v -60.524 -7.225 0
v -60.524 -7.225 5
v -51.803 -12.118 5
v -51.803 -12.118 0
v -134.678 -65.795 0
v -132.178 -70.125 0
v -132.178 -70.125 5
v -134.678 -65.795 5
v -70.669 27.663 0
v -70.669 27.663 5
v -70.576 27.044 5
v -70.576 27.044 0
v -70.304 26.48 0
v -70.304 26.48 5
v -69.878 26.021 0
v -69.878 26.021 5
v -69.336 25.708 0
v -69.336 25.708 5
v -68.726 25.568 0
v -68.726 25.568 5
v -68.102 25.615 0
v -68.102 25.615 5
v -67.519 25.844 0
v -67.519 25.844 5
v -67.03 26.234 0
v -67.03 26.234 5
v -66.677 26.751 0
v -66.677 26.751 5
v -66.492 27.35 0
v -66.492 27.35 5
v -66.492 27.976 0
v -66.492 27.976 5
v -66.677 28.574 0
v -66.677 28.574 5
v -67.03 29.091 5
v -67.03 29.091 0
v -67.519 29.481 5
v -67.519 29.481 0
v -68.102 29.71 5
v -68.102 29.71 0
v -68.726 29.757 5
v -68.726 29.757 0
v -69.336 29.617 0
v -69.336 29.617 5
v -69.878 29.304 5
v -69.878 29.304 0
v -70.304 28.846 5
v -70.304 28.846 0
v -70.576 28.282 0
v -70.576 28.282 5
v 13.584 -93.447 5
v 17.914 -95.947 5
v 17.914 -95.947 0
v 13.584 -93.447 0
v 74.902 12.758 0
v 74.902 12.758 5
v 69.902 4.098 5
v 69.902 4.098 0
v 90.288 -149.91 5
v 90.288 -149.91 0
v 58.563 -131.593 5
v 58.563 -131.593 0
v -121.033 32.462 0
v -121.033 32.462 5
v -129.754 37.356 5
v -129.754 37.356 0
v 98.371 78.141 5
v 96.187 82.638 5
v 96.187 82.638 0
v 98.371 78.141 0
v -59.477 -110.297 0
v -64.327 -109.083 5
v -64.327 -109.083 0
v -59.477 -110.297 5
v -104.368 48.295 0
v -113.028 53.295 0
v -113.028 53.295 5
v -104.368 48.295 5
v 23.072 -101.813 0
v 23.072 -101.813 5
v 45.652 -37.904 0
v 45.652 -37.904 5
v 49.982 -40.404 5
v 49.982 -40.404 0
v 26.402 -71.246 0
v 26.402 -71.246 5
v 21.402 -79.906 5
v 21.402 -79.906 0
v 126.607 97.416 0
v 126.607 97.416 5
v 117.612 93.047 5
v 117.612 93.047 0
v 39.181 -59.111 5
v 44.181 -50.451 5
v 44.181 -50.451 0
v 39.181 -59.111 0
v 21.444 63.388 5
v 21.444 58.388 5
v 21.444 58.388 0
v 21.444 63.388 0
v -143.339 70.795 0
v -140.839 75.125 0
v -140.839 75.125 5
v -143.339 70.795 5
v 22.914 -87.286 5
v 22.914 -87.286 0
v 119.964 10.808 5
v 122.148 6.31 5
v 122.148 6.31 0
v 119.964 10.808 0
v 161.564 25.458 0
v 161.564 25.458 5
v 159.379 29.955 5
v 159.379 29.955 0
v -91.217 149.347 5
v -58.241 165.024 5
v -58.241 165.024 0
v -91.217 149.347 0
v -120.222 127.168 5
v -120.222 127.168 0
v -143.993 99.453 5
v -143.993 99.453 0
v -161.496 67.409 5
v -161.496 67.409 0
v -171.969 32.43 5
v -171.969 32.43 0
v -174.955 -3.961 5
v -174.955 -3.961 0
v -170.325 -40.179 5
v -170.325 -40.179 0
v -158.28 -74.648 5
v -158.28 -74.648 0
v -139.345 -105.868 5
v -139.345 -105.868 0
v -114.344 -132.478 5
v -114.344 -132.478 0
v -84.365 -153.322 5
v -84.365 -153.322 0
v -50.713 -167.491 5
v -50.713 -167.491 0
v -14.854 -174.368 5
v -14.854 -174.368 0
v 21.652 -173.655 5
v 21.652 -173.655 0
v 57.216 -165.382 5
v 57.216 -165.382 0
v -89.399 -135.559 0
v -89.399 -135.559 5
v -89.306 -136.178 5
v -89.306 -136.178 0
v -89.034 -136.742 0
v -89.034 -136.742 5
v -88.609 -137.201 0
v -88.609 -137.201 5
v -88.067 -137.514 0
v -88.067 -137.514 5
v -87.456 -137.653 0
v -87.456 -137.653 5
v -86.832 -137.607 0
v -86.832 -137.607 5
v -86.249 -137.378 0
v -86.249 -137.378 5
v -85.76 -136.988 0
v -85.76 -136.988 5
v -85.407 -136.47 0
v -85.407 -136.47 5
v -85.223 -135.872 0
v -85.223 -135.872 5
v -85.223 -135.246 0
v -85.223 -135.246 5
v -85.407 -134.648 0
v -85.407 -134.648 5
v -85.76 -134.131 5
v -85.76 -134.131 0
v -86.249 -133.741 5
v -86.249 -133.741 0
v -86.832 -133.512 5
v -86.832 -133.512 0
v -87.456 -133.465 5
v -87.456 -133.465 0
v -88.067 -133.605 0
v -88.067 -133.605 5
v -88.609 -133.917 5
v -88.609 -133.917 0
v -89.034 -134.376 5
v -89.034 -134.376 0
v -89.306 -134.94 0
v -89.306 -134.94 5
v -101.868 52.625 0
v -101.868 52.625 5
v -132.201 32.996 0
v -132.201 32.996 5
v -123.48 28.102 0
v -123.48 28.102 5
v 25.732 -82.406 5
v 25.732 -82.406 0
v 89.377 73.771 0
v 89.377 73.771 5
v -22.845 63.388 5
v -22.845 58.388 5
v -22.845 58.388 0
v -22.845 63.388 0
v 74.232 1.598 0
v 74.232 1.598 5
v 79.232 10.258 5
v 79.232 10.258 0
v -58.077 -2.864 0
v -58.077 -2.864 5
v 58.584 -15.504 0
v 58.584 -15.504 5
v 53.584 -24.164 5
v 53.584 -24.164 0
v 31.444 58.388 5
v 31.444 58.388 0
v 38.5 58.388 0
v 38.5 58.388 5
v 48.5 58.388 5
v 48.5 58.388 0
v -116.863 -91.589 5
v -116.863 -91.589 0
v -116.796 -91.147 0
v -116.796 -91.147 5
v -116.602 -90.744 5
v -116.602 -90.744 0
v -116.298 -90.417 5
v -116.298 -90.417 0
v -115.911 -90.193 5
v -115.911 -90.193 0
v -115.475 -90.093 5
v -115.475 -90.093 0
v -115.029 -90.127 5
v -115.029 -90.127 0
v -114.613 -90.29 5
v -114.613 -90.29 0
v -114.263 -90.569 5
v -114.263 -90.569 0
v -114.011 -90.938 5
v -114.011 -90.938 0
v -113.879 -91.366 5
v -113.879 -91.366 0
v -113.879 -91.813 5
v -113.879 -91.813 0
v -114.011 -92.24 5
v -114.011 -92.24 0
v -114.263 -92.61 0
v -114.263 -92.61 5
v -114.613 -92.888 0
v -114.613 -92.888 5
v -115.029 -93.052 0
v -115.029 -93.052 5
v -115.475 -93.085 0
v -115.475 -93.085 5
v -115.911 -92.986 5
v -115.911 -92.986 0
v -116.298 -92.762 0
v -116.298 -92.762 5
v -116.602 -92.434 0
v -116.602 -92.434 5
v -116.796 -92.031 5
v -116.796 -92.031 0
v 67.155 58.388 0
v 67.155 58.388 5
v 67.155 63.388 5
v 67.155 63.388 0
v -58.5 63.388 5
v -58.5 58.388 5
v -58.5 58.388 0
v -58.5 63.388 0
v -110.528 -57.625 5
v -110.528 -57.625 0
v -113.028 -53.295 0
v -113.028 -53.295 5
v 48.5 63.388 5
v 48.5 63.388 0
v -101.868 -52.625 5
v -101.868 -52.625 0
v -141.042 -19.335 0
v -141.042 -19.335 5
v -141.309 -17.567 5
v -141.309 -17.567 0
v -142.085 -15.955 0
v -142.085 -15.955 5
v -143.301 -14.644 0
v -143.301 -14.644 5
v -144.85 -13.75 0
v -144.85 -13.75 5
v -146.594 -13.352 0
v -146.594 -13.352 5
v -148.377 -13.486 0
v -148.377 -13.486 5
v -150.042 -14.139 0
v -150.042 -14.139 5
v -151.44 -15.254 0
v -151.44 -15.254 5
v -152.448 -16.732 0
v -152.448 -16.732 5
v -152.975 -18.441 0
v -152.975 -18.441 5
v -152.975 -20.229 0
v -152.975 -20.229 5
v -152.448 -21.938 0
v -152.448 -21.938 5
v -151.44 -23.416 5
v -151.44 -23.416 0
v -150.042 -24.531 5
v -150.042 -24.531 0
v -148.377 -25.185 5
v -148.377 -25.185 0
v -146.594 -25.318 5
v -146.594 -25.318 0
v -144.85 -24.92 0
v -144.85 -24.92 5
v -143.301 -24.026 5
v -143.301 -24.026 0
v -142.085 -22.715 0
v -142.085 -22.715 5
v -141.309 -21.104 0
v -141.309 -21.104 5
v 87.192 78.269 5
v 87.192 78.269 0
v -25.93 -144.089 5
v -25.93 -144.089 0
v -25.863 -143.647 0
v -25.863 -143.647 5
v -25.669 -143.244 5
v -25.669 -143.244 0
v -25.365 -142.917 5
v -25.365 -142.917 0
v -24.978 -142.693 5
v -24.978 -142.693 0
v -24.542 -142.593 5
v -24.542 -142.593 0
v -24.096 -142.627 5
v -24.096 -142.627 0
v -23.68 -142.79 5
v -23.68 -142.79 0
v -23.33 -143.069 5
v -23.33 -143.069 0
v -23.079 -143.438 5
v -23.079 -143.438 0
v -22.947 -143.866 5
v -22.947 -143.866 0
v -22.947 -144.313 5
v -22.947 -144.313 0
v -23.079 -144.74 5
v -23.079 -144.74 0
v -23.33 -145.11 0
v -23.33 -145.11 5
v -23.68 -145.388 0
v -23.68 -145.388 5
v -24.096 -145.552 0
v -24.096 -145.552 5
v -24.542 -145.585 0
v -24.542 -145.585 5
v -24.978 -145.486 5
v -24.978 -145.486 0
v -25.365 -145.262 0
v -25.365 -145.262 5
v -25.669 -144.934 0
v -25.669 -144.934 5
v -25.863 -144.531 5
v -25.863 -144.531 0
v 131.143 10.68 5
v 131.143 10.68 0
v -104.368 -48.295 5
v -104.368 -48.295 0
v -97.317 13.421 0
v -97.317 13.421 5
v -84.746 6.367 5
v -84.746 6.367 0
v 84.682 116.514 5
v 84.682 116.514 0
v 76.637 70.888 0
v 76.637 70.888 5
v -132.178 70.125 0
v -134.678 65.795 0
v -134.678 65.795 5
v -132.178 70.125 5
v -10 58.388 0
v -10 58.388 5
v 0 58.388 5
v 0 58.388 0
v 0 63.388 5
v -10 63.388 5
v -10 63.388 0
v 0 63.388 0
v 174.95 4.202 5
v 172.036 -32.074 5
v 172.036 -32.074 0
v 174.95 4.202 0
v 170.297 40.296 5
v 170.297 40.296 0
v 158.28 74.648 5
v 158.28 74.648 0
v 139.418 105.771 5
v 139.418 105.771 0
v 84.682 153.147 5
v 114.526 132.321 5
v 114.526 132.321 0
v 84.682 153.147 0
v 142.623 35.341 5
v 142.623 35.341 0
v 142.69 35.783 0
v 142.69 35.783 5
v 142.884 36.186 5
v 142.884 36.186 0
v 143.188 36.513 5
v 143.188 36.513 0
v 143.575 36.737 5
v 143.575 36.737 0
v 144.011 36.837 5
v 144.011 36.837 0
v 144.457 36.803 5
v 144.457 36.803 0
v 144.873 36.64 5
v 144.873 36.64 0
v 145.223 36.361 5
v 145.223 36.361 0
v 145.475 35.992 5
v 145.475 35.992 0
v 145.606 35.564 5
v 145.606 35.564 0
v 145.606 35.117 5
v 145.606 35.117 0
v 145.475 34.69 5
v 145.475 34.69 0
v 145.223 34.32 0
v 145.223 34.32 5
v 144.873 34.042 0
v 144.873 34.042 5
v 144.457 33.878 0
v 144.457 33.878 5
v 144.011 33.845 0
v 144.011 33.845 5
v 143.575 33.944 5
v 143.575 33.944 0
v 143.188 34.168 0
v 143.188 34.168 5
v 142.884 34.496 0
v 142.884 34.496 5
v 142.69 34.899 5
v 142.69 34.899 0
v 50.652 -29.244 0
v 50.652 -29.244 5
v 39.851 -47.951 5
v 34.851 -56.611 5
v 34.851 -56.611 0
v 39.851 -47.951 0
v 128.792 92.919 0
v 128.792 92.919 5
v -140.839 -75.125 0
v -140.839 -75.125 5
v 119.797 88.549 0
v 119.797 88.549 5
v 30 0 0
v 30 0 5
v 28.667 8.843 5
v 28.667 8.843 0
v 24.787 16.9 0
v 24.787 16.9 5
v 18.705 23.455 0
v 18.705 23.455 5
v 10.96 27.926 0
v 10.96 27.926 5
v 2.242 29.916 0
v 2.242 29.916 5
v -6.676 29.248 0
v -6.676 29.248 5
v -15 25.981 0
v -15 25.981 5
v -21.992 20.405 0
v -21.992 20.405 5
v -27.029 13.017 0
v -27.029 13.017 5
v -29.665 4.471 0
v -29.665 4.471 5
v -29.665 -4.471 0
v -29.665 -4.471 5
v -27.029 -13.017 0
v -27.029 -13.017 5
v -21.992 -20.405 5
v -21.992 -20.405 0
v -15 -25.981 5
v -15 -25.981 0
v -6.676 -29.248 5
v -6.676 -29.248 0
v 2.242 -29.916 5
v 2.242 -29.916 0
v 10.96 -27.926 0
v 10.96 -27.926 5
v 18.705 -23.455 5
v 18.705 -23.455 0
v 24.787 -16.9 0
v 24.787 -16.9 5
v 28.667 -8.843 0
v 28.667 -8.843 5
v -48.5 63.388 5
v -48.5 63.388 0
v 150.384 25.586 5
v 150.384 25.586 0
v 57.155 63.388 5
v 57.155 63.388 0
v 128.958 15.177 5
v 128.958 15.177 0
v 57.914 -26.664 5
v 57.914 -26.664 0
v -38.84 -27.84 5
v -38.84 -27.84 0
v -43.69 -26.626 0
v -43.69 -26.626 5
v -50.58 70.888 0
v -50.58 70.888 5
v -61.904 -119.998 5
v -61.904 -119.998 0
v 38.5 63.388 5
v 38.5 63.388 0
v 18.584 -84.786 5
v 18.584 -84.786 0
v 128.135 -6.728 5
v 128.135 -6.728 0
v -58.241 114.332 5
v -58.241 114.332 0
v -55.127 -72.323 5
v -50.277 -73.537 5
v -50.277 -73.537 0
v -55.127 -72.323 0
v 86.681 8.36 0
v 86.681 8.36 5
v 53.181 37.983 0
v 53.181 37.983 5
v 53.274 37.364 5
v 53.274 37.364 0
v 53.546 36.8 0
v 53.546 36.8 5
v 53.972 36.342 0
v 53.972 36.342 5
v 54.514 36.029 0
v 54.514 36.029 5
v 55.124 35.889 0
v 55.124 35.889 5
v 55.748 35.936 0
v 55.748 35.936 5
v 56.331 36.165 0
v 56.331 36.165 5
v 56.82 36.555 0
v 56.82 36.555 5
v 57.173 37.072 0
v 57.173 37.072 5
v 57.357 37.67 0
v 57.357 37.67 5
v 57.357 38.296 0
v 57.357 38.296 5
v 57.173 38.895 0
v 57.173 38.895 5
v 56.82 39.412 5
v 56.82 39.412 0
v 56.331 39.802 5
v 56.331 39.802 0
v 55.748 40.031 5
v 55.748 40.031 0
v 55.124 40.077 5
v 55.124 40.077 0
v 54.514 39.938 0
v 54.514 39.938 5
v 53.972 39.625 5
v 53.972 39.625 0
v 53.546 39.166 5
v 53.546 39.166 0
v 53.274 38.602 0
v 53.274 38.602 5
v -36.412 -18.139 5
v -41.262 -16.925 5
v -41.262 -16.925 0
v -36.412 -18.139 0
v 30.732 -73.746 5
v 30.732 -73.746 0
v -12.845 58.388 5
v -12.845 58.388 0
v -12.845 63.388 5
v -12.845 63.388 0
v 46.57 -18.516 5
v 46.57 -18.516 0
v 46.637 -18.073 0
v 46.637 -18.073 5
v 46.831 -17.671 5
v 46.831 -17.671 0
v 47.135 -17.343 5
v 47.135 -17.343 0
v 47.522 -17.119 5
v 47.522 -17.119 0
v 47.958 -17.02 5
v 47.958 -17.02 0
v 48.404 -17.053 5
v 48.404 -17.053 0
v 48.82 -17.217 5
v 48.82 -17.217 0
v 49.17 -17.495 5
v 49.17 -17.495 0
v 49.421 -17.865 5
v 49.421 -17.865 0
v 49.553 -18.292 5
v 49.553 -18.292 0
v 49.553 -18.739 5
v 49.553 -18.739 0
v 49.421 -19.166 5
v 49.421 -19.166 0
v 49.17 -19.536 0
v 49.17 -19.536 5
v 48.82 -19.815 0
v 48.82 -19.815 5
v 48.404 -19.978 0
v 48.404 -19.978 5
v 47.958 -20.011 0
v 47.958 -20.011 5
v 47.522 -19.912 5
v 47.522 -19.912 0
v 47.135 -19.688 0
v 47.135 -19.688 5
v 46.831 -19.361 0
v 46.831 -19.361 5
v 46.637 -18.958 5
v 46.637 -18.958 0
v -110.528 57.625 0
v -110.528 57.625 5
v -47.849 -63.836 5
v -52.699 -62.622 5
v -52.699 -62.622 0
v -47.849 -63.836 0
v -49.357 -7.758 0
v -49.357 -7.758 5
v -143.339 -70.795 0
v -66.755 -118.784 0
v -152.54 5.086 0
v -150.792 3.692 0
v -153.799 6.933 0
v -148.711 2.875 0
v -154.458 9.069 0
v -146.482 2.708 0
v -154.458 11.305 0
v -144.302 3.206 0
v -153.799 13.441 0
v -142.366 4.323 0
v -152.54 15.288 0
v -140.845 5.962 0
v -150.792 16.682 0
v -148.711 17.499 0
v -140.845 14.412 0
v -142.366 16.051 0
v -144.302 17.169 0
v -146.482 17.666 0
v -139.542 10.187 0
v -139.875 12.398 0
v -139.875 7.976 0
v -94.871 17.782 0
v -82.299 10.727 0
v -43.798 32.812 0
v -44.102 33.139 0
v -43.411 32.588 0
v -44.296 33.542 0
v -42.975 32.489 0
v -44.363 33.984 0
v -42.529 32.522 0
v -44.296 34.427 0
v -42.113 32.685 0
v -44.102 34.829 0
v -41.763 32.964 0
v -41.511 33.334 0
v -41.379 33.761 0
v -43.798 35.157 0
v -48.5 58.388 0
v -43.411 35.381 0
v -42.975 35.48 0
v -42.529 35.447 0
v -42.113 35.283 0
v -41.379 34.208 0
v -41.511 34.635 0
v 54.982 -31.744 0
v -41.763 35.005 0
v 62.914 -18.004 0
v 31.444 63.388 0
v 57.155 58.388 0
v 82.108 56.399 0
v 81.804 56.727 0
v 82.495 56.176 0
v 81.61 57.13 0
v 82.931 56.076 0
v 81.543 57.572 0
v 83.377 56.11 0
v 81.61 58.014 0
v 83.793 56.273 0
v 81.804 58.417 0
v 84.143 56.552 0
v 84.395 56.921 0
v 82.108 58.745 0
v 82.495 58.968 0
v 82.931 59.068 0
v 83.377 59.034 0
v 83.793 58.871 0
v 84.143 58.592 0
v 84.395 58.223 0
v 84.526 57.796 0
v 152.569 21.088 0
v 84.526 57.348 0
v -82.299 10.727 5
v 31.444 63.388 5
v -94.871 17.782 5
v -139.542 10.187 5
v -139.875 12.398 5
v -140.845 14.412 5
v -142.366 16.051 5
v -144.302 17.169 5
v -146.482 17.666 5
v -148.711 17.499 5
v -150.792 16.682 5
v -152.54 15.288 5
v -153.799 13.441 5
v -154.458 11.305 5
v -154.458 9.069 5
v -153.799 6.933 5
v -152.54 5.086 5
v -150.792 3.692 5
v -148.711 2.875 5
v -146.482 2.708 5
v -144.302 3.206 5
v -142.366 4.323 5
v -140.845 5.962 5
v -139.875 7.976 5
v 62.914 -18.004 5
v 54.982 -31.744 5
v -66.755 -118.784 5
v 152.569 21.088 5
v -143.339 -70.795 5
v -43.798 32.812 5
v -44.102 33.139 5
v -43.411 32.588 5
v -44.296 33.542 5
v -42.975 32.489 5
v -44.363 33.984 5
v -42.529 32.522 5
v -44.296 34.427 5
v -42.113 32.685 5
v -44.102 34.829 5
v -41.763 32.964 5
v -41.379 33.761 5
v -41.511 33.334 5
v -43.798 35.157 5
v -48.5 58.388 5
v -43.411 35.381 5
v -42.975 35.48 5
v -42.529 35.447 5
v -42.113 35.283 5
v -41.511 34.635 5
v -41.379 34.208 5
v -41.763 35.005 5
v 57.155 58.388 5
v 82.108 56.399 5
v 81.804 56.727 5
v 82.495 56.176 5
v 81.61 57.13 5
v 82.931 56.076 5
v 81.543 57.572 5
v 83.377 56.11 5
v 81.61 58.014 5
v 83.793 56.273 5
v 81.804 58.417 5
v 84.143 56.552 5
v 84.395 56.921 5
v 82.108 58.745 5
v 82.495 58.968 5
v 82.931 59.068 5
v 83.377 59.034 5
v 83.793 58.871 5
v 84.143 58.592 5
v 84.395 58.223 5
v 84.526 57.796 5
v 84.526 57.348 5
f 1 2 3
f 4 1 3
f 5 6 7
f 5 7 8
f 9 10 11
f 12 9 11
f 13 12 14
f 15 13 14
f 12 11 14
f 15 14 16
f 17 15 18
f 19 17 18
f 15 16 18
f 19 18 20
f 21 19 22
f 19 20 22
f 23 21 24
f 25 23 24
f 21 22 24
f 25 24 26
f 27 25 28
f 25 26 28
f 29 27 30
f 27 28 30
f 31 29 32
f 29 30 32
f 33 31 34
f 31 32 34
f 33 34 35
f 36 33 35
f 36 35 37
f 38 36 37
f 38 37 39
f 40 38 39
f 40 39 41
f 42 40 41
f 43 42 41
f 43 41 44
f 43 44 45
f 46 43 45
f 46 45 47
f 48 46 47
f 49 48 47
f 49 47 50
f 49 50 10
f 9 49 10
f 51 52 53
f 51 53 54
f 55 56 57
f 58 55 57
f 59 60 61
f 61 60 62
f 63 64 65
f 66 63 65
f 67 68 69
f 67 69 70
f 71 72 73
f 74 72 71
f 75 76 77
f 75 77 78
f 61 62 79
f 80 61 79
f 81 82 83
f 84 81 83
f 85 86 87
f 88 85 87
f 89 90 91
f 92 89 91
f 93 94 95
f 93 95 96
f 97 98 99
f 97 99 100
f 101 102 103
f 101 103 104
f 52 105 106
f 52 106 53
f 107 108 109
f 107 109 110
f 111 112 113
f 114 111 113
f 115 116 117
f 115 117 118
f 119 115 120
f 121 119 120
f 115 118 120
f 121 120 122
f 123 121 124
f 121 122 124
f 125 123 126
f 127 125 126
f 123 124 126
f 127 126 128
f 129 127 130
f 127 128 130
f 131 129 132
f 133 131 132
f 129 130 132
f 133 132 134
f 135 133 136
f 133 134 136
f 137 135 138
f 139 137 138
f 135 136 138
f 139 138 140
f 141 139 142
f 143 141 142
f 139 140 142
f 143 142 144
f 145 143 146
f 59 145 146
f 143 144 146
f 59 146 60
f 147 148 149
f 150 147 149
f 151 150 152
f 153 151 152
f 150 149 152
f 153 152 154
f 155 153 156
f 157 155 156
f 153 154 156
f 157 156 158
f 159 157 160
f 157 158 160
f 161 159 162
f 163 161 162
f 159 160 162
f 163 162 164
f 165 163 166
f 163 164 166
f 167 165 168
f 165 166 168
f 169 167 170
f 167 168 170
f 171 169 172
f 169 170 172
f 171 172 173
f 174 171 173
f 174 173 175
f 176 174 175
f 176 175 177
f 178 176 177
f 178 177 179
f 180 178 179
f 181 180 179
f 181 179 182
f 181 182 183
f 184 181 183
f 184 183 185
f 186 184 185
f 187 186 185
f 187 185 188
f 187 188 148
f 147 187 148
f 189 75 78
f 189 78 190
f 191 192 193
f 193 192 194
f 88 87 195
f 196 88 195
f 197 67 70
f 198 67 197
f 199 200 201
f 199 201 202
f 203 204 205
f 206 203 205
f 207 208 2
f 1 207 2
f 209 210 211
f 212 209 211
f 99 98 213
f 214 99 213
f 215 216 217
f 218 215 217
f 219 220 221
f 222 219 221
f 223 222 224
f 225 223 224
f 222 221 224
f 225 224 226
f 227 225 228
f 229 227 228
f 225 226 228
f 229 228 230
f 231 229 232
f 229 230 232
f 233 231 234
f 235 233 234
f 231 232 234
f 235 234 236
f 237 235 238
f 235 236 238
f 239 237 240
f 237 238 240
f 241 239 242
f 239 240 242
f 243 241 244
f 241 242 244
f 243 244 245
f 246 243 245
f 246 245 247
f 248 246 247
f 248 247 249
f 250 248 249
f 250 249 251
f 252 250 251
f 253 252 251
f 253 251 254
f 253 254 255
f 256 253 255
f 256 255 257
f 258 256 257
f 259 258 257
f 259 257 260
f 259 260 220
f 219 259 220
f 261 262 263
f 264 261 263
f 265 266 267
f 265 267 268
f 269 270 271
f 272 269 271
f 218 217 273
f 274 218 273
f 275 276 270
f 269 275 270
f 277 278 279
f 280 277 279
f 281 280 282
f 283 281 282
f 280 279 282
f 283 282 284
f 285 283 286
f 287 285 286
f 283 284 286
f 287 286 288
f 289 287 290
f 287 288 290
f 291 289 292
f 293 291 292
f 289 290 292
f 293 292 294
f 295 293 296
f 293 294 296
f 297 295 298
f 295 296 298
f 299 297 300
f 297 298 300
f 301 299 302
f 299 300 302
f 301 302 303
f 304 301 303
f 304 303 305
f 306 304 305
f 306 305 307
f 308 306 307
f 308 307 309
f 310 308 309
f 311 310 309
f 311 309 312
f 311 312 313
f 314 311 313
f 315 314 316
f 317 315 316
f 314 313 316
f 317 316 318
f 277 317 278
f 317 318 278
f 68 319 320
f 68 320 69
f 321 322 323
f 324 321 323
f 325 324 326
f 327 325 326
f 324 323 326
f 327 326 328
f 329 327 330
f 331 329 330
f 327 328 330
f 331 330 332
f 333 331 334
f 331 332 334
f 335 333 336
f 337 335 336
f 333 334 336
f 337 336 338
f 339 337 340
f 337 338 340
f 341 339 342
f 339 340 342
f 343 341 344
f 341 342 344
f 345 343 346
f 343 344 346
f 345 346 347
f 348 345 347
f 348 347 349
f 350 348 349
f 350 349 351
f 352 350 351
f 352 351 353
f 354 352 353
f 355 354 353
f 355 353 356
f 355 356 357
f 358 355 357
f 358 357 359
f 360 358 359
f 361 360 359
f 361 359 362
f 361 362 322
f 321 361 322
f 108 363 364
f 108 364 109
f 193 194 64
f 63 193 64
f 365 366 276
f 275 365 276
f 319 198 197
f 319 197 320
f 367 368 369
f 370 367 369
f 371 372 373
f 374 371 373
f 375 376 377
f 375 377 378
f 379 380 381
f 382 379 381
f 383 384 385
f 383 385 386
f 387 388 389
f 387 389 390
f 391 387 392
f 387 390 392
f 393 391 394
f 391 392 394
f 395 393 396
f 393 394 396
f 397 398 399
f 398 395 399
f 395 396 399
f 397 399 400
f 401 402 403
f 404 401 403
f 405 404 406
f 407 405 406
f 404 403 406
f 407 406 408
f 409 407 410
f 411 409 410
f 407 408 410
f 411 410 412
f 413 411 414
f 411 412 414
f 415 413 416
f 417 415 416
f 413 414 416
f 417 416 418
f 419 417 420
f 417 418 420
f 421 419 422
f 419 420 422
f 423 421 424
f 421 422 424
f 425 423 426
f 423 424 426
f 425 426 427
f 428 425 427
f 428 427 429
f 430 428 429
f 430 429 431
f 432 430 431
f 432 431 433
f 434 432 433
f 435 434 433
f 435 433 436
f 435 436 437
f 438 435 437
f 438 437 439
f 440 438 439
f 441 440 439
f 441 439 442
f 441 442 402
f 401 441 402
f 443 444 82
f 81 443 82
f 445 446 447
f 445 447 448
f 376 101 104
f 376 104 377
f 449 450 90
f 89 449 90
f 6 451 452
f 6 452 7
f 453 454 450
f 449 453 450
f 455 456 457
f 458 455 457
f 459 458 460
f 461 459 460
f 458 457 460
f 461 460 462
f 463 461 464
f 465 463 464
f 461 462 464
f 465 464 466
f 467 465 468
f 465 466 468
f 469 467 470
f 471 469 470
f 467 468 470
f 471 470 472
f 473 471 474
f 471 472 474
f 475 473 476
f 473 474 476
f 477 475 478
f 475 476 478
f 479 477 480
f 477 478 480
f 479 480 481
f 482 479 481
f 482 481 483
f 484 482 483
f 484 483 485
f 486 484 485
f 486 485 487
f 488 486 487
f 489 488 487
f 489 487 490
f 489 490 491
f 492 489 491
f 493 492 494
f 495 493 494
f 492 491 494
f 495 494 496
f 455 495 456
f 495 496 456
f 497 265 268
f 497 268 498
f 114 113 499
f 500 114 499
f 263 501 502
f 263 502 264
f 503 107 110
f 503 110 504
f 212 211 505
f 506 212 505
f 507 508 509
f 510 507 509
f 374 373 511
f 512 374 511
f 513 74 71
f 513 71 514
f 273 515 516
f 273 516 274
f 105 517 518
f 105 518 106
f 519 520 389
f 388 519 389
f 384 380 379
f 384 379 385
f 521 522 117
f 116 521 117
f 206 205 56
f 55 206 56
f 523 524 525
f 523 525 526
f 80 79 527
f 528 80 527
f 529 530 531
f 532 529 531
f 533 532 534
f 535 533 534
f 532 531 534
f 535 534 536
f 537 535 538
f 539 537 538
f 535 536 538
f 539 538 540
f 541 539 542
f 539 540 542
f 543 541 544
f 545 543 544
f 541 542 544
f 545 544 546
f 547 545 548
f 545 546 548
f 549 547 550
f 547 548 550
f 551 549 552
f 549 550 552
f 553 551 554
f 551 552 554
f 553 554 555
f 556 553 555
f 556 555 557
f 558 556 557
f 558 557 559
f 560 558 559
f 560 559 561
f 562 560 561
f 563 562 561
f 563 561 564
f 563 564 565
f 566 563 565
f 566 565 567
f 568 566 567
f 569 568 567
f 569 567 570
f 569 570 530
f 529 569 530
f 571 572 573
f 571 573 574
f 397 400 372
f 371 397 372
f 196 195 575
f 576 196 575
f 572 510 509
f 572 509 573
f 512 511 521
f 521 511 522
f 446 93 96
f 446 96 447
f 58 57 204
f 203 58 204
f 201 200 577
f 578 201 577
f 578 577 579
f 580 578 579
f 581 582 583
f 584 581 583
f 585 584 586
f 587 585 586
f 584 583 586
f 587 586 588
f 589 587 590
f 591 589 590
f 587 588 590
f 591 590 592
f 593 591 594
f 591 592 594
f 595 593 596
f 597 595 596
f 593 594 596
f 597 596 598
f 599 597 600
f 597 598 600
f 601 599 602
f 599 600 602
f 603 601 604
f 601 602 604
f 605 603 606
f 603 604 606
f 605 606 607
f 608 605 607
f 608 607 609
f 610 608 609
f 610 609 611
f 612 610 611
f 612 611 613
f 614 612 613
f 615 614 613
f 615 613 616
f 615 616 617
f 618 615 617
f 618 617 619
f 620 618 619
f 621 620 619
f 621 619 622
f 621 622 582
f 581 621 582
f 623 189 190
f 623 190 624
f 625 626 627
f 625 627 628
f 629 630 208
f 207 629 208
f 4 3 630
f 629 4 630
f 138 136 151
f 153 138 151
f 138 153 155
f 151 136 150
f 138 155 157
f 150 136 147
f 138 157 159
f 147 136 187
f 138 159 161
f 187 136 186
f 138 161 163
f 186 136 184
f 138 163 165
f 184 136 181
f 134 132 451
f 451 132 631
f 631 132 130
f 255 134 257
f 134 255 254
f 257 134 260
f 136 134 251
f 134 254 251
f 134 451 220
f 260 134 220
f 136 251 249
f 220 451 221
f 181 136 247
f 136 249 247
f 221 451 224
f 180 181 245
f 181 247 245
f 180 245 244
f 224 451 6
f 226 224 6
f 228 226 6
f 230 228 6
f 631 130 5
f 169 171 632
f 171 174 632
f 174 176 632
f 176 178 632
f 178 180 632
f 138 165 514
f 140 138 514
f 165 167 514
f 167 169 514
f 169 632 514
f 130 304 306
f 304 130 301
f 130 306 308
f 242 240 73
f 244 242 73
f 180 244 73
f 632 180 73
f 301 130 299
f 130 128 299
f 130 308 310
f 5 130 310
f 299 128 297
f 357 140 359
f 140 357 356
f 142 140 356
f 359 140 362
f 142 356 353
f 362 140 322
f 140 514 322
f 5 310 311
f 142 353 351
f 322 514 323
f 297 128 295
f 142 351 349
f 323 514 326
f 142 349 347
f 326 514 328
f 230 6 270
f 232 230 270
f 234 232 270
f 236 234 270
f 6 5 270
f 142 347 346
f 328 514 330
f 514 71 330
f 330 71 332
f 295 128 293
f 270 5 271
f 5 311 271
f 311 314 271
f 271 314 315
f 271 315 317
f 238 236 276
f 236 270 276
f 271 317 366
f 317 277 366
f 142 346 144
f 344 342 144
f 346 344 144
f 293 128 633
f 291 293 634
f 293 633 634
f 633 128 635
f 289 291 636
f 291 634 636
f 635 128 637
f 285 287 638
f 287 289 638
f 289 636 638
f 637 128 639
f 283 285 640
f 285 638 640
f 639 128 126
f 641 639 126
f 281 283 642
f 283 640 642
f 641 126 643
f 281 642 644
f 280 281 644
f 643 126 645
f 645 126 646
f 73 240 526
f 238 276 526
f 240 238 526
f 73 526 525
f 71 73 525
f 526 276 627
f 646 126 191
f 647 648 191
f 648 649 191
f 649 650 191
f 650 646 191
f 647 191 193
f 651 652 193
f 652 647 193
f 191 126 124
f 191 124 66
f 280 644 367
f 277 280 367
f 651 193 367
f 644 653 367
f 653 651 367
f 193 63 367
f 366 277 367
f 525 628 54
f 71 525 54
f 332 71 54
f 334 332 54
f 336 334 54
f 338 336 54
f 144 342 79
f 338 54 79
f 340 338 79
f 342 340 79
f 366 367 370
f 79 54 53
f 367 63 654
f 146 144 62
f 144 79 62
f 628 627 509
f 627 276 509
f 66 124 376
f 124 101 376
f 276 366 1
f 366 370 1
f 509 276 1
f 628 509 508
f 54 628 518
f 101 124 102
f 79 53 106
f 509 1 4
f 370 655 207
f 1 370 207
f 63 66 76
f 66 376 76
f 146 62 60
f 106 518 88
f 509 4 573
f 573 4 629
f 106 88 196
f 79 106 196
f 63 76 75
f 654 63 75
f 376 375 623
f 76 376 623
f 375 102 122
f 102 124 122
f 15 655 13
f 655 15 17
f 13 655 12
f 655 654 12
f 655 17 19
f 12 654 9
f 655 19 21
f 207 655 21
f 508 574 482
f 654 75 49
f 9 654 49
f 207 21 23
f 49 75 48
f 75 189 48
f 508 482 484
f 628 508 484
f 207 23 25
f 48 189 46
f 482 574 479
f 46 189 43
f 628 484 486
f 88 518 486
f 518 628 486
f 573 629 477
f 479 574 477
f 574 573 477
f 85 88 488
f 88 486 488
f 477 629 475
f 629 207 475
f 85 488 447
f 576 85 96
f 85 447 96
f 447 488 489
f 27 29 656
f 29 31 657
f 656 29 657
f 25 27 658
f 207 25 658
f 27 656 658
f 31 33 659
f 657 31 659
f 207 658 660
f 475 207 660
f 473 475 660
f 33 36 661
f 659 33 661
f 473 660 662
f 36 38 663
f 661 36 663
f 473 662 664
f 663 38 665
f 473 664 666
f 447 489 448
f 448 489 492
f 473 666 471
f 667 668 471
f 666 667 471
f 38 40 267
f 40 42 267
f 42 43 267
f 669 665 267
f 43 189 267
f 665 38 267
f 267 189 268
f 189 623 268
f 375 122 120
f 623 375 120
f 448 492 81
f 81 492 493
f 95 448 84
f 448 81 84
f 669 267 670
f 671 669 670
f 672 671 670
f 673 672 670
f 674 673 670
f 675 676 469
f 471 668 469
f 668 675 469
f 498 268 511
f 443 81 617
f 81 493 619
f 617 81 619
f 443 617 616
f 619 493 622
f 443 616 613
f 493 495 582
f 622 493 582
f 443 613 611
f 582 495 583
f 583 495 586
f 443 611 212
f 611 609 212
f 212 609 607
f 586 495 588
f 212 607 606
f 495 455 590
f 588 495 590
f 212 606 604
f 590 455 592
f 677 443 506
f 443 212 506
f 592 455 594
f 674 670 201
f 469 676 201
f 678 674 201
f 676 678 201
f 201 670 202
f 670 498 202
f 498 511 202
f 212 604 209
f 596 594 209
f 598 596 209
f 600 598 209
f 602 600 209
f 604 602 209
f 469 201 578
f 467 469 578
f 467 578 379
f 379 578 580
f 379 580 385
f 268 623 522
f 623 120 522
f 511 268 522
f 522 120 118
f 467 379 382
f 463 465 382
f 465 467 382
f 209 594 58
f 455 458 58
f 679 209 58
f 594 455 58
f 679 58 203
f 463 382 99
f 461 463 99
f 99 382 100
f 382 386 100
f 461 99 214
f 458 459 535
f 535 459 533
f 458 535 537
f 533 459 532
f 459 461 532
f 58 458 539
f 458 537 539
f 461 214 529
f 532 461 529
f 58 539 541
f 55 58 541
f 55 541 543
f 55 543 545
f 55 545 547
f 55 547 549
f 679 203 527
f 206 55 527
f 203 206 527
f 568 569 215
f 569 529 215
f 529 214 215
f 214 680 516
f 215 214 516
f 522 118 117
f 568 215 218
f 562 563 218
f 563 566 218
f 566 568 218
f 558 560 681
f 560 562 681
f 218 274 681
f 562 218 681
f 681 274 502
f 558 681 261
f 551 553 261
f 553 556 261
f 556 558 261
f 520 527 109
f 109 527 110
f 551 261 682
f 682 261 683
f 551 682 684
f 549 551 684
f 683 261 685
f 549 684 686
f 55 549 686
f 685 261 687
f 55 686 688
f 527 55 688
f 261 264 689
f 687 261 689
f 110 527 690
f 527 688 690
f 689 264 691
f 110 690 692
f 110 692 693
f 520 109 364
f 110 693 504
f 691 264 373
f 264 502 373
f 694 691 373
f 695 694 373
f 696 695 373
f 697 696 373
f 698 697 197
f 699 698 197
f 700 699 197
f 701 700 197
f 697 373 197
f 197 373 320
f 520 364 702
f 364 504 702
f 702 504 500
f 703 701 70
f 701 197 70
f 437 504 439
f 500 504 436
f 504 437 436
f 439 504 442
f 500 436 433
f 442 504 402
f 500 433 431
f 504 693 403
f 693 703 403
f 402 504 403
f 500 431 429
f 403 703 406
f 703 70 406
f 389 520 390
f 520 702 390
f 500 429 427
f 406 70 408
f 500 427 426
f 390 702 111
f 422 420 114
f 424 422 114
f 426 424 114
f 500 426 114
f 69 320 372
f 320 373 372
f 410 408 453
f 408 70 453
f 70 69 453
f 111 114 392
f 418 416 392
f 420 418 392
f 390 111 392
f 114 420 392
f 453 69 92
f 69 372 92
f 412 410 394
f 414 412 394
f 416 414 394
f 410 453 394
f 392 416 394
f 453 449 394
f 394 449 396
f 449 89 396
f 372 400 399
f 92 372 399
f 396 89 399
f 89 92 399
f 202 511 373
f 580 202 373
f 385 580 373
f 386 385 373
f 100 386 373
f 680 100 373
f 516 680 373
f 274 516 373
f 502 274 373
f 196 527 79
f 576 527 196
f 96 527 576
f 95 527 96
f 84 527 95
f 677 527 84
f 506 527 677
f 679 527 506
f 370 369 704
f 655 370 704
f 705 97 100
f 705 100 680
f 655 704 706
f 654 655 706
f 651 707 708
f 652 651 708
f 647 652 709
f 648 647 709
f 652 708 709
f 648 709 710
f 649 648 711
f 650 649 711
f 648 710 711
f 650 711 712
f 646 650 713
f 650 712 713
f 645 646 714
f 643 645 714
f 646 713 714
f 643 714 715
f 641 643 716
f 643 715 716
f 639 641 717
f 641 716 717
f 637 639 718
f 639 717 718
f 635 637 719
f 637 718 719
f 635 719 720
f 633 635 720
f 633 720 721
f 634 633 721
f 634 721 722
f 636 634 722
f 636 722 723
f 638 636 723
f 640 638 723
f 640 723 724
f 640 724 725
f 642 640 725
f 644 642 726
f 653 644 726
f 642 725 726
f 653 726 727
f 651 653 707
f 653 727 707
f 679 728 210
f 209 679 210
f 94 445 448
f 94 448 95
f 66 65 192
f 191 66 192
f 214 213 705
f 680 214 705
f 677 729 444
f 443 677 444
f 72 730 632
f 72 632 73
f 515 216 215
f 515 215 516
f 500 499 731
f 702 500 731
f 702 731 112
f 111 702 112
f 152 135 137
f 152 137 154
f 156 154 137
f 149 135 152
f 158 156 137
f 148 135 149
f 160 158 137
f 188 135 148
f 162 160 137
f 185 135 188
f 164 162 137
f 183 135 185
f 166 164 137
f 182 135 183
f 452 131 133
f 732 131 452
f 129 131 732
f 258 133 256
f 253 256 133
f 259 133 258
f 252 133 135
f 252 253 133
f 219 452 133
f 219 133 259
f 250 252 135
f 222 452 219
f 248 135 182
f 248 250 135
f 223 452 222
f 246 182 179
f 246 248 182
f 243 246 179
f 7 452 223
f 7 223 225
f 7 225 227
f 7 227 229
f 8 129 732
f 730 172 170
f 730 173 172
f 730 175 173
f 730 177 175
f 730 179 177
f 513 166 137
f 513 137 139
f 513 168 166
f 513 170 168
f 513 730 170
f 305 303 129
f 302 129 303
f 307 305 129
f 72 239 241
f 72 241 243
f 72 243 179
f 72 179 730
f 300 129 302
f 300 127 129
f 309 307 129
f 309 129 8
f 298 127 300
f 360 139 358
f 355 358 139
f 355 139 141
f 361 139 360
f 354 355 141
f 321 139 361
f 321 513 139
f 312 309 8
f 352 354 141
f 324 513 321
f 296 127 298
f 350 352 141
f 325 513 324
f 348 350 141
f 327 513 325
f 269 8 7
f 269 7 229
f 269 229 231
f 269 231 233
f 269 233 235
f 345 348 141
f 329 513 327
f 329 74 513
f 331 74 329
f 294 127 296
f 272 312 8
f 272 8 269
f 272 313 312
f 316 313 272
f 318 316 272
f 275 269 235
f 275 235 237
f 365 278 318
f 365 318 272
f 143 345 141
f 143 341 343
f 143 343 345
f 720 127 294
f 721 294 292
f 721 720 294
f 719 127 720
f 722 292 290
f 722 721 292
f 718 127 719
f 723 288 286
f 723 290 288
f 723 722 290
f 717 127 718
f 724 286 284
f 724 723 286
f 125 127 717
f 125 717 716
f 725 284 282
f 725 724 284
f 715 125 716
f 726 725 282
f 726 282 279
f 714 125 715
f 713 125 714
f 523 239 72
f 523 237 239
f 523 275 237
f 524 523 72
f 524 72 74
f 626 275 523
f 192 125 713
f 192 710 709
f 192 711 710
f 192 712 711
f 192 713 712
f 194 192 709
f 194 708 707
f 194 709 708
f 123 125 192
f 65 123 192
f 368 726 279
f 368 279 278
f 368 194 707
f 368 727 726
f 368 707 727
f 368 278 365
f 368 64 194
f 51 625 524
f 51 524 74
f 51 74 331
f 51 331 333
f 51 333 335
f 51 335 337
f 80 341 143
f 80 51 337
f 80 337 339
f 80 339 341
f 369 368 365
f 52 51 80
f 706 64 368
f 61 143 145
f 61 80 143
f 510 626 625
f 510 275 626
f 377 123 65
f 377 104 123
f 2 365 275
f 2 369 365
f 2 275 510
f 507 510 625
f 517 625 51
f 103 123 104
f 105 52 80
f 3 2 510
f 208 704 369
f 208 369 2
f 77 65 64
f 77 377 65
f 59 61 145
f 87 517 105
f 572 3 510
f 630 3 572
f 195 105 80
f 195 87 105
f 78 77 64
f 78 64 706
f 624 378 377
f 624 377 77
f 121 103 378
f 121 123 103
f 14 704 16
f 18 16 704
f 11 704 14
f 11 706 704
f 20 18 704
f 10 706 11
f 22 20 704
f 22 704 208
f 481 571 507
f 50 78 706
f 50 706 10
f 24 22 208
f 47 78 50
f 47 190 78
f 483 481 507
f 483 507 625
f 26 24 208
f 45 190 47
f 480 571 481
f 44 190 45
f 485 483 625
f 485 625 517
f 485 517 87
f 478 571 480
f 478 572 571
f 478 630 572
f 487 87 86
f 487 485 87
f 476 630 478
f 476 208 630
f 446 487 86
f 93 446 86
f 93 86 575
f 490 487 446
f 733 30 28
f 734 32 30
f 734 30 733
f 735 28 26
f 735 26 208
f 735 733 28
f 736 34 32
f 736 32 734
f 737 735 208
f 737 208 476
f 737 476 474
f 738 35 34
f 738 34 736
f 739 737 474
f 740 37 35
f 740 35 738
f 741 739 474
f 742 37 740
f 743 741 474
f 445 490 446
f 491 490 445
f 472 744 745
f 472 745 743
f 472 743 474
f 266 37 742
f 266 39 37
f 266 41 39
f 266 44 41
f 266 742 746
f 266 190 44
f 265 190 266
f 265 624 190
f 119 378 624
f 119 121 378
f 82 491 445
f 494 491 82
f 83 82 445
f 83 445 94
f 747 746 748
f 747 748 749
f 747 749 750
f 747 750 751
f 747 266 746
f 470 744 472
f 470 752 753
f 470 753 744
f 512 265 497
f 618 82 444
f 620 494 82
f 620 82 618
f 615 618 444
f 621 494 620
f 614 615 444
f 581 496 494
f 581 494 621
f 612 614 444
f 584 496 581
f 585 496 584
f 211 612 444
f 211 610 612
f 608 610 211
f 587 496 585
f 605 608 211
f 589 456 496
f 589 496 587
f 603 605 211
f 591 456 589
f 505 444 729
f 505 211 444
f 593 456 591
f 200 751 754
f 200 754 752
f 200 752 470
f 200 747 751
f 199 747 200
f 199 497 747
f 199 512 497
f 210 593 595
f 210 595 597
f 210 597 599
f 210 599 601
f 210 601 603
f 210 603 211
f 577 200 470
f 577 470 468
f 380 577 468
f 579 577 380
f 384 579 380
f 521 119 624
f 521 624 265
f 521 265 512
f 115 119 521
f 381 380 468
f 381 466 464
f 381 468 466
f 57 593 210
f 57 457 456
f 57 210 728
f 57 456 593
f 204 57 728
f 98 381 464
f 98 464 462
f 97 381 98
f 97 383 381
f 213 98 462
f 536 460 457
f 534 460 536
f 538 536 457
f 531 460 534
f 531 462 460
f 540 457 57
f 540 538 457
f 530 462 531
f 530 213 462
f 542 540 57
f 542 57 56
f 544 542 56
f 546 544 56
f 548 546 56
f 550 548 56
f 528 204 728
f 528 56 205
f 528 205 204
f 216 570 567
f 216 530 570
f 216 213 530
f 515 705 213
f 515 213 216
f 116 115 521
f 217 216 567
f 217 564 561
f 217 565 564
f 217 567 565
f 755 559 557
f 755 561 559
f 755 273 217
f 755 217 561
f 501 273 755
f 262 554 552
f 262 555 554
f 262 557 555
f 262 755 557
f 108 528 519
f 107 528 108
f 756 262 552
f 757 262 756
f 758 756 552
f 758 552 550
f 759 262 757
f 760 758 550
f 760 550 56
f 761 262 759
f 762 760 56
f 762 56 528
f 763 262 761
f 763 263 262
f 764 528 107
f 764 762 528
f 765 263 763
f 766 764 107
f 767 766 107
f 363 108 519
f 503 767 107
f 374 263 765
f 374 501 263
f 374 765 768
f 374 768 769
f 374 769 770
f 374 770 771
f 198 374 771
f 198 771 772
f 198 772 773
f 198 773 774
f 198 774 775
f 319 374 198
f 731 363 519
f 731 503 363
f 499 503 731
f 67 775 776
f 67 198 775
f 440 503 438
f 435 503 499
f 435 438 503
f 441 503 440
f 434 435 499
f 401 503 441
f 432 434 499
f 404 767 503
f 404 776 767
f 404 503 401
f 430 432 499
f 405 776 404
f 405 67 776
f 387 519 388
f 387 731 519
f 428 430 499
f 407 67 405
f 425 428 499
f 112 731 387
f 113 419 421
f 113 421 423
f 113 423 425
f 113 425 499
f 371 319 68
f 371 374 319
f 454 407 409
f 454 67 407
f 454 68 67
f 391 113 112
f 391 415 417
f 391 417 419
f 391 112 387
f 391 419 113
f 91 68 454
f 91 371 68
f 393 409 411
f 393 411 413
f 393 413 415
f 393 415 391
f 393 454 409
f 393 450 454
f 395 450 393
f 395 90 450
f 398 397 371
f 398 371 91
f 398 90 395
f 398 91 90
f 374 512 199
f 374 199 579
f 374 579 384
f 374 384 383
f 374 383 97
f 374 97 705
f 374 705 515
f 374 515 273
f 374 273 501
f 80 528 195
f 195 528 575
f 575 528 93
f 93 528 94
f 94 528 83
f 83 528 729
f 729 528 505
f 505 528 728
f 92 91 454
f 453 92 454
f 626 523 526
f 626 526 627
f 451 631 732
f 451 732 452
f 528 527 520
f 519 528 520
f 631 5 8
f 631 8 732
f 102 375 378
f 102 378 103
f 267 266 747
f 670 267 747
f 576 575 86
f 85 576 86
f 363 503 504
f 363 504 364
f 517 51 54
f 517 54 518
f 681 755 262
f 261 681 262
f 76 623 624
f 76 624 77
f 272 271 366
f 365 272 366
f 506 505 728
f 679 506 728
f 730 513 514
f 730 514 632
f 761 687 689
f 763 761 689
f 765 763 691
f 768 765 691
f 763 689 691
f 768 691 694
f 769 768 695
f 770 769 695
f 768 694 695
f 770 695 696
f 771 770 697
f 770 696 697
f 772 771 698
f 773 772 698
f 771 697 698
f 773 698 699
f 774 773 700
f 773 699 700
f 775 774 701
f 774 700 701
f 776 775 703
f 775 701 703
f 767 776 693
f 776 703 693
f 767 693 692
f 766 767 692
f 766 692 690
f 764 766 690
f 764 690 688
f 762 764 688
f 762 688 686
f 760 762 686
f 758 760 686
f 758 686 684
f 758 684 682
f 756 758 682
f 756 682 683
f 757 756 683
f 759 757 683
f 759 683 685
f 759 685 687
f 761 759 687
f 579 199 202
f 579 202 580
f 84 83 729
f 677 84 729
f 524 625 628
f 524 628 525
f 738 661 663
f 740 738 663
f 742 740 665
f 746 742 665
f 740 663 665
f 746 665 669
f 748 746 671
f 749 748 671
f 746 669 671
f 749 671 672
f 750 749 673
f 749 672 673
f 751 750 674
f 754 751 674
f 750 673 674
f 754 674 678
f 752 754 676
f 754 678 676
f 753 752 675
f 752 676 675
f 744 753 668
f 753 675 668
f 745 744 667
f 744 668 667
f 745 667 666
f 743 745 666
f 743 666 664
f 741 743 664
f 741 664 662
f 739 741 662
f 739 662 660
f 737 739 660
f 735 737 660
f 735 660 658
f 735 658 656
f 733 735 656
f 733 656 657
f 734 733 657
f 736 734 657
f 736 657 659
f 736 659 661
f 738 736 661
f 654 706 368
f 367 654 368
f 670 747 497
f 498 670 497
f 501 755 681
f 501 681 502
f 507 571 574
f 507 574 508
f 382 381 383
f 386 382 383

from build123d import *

# Parameters (mm, degrees)
ESQUISSE1_R             = 175
BOSS_EXTRU_1_DEPTH      = 5
ENL_V_MAT_EXTRU_1_DEPTH = 5
ESQUISSE3_W             = 10
ESQUISSE3_H             = 5
ENL_V_MAT_EXTRU_2_DEPTH = 10
ESQUISSE4_R             = 1.5
ENL_V_MAT_EXTRU_3_DEPTH = 10
ENL_V_MAT_EXTRU_4_DEPTH = 10
ESQUISSE6_W             = 10
ESQUISSE6_H             = 5
ENL_V_MAT_EXTRU_5_DEPTH = 5
TROU_TARAUD_M51_D       = 4.2
ESQUISSE10_R            = 30
ESQUISSE10_R_2          = 6
ESQUISSE10_R_3          = 7.5
ENL_V_MAT_EXTRU_6_DEPTH = 5
ESQUISSE11_R            = 1.5
ENL_V_MAT_EXTRU_7_DEPTH = 10


with BuildPart() as part:
    # Esquisse1 → Boss.-Extru.1 (new body)
    with BuildSketch(Plane.XY):
        Circle(ESQUISSE1_R)
    extrude(amount=BOSS_EXTRU_1_DEPTH)

    # Esquisse2 → Enlèv. mat.-Extru.1 (cut)
    with BuildSketch(Plane(origin=(0, 0, 0), x_dir=(-1, 0, 0), z_dir=(0, 0, -1))):
        Polygon((58.240826849, 114.332025077), (58.240826849, 213.87663255), (-84.681680643, 213.87663255), (-84.681680643, 116.513512453), (-76.636603499, 70.887612711), (50.580404788, 70.887612711), align=None)
        Polygon((-128.134851608, -6.727976949), (-214.343010489, -56.500280686), (-142.881756743, -180.274802947), (-58.562821347, -131.593242898), (-23.072171671, -101.813051845), (-86.680675815, 8.360109125), align=None)
    extrude(amount=-ENL_V_MAT_EXTRU_1_DEPTH, mode=Mode.SUBTRACT)

    # Esquisse3 → Enlèv. mat.-Extru.2 (cut)
    with BuildSketch(Plane.XY.offset(5)):
        Polygon((-49.356660547, -7.757843325), (-58.077491782, -2.864265639), (-60.524280625, -7.224681256), (-51.803449391, -12.118258943), align=None)
        Polygon((-82.29909118, 10.727360567), (-94.870678761, 17.781738621), (-97.317467605, 13.421323004), (-84.745880023, 6.36694495), align=None)
        Polygon((-121.033172465, 32.462471681), (-129.7540037, 37.356049368), (-132.200792544, 32.995633751), (-123.479961309, 28.102056064), align=None)
        Polygon((-36.411918308, -18.139201989), (-38.839769225, -27.840002983), (-43.690169722, -26.626077525), (-41.262318805, -16.925276531), align=None)
        Polygon((-47.8486979, -63.836374764), (-50.276548817, -73.537175758), (-55.126949314, -72.323250299), (-52.699098397, -62.622449305), align=None)
        Polygon((-59.476502021, -110.296811432), (-61.904352938, -119.997612426), (-66.754753435, -118.783686967), (-64.326902518, -109.082885973), align=None)
        Polygon((62.914433511, -18.00423005), (58.584306492, -15.50423005), (53.584306492, -24.164484088), (57.914433511, -26.664484088), align=None)
        Polygon((39.851125271, -47.951051713), (44.18125229, -50.451051713), (39.18125229, -59.11130575), (34.851125271, -56.61130575), align=None)
        Polygon((18.584306492, -84.786262353), (22.914433511, -87.286262353), (17.914433511, -95.946516391), (13.584306492, -93.446516391), align=None)
        with Locations((62.155135581, 60.887612711)):
            Rectangle(ESQUISSE3_W, ESQUISSE3_H)
        with Locations((-17.844864419, 60.887612711)):
            Rectangle(ESQUISSE3_W, ESQUISSE3_H)
        with Locations((26.44406925, 60.887612711)):
            Rectangle(ESQUISSE3_W, ESQUISSE3_H)
        Polygon((122.148385312, 6.310171572), (119.963600629, 10.807583704), (128.958424895, 15.177153069), (131.143209577, 10.679740937), align=None)
        Polygon((159.379066535, 29.955107573), (150.38424227, 25.585538209), (152.569026952, 21.088126076), (161.563851217, 25.457695441), align=None)
        Polygon((126.607296299, 97.416289564), (117.612472034, 93.046720199), (119.797256716, 88.549308067), (128.792080981, 92.918877432), align=None)
        Polygon((96.186654659, 82.63833506), (98.371439341, 78.140922927), (89.376615076, 73.771353563), (87.191830393, 78.268765695), align=None)
    extrude(amount=-ENL_V_MAT_EXTRU_2_DEPTH, mode=Mode.SUBTRACT)

    # Esquisse4 → Enlèv. mat.-Extru.3 (cut)
    with BuildSketch(Plane(origin=(0, 0, 0), x_dir=(-1, 0, 0), z_dir=(0, 0, -1))):
        with Locations((115.362702052, -91.589286674)):
            Circle(ESQUISSE4_R)
        with Locations((24.430034655, -144.089286674)):
            Circle(ESQUISSE4_R)
        with Locations((-48.069965345, -18.515603125)):
            Circle(ESQUISSE4_R)
        with Locations((42.862702052, 33.984396875)):
            Circle(ESQUISSE4_R)
    extrude(amount=-ENL_V_MAT_EXTRU_3_DEPTH, mode=Mode.SUBTRACT)

    # Esquisse5 → Enlèv. mat.-Extru.4 (cut)
    with BuildSketch(Plane(origin=(0, 0, 0), x_dir=(-1, 0, 0), z_dir=(0, 0, -1))):
        Polygon((132.178427666, -70.125229259), (134.678427666, -65.79510224), (143.338681704, -70.79510224), (140.838681704, -75.125229259), align=None)
        Polygon((110.527792572, -57.625229259), (113.027792572, -53.29510224), (104.367538534, -48.29510224), (101.867538534, -52.625229259), align=None)
        Polygon((134.678427666, 65.79510224), (132.178427666, 70.125229259), (140.838681704, 75.125229259), (143.338681704, 70.79510224), align=None)
        Polygon((110.527792572, 57.625229259), (113.027792572, 53.29510224), (104.367538534, 48.29510224), (101.867538534, 52.625229259), align=None)
    extrude(amount=-ENL_V_MAT_EXTRU_4_DEPTH, mode=Mode.SUBTRACT)

    # Esquisse6 → Enlèv. mat.-Extru.5 (cut)
    with BuildSketch(Plane.XY.offset(5)):
        Polygon((25.731885433, -82.406292477), (30.731885433, -73.746038439), (26.401758414, -71.246038439), (21.401758414, -79.906292477), align=None)
        Polygon((49.981885433, -40.404060393), (54.981885433, -31.743806355), (50.651758414, -29.243806355), (45.651758414, -37.904060393), align=None)
        with Locations((43.5, 60.887612711)):
            Rectangle(ESQUISSE6_W, ESQUISSE6_H)
        Polygon((74.901758414, 12.758425728), (69.901758414, 4.09817169), (74.231885433, 1.59817169), (79.231885433, 10.258425728), align=None)
        with Locations((-5, 60.887612711)):
            Rectangle(ESQUISSE6_W, ESQUISSE6_H)
        with Locations((-53.5, 60.887612711)):
            Rectangle(ESQUISSE6_W, ESQUISSE6_H)
    extrude(amount=-ENL_V_MAT_EXTRU_5_DEPTH, mode=Mode.SUBTRACT)

    # Trou taraudé M51 (through all)
    with Locations(Plane(origin=(0, 0, -85), x_dir=(1, 0, 0), z_dir=(0, 0, -1))):
        with Locations((-68.568956805, -27.662548456), (55.280905682, -37.98337033), (-87.299337242, 135.559338217)):
            Hole(TROU_TARAUD_M51_D / 2)

    # Esquisse10 → Enlèv. mat.-Extru.6 (cut)
    with BuildSketch(Plane.XY.offset(5)):
        Circle(ESQUISSE10_R)
        with Locations((-147.042149298, -19.335087814)):
            Circle(ESQUISSE10_R_2)
        with Locations((-147.042149298, 10.187091802)):
            Circle(ESQUISSE10_R_3)
    extrude(amount=-ENL_V_MAT_EXTRU_6_DEPTH, mode=Mode.SUBTRACT)

    # Esquisse11 → Enlèv. mat.-Extru.7 (cut)
    with BuildSketch(Plane(origin=(0, 0, 0), x_dir=(-1, 0, 0), z_dir=(0, 0, -1))):
        with Locations((-144.123215362, 35.340734311)):
            Circle(ESQUISSE11_R)
        with Locations((-83.043195011, 57.572043627)):
            Circle(ESQUISSE11_R)
    extrude(amount=-ENL_V_MAT_EXTRU_7_DEPTH, mode=Mode.SUBTRACT)


solid = part.part
